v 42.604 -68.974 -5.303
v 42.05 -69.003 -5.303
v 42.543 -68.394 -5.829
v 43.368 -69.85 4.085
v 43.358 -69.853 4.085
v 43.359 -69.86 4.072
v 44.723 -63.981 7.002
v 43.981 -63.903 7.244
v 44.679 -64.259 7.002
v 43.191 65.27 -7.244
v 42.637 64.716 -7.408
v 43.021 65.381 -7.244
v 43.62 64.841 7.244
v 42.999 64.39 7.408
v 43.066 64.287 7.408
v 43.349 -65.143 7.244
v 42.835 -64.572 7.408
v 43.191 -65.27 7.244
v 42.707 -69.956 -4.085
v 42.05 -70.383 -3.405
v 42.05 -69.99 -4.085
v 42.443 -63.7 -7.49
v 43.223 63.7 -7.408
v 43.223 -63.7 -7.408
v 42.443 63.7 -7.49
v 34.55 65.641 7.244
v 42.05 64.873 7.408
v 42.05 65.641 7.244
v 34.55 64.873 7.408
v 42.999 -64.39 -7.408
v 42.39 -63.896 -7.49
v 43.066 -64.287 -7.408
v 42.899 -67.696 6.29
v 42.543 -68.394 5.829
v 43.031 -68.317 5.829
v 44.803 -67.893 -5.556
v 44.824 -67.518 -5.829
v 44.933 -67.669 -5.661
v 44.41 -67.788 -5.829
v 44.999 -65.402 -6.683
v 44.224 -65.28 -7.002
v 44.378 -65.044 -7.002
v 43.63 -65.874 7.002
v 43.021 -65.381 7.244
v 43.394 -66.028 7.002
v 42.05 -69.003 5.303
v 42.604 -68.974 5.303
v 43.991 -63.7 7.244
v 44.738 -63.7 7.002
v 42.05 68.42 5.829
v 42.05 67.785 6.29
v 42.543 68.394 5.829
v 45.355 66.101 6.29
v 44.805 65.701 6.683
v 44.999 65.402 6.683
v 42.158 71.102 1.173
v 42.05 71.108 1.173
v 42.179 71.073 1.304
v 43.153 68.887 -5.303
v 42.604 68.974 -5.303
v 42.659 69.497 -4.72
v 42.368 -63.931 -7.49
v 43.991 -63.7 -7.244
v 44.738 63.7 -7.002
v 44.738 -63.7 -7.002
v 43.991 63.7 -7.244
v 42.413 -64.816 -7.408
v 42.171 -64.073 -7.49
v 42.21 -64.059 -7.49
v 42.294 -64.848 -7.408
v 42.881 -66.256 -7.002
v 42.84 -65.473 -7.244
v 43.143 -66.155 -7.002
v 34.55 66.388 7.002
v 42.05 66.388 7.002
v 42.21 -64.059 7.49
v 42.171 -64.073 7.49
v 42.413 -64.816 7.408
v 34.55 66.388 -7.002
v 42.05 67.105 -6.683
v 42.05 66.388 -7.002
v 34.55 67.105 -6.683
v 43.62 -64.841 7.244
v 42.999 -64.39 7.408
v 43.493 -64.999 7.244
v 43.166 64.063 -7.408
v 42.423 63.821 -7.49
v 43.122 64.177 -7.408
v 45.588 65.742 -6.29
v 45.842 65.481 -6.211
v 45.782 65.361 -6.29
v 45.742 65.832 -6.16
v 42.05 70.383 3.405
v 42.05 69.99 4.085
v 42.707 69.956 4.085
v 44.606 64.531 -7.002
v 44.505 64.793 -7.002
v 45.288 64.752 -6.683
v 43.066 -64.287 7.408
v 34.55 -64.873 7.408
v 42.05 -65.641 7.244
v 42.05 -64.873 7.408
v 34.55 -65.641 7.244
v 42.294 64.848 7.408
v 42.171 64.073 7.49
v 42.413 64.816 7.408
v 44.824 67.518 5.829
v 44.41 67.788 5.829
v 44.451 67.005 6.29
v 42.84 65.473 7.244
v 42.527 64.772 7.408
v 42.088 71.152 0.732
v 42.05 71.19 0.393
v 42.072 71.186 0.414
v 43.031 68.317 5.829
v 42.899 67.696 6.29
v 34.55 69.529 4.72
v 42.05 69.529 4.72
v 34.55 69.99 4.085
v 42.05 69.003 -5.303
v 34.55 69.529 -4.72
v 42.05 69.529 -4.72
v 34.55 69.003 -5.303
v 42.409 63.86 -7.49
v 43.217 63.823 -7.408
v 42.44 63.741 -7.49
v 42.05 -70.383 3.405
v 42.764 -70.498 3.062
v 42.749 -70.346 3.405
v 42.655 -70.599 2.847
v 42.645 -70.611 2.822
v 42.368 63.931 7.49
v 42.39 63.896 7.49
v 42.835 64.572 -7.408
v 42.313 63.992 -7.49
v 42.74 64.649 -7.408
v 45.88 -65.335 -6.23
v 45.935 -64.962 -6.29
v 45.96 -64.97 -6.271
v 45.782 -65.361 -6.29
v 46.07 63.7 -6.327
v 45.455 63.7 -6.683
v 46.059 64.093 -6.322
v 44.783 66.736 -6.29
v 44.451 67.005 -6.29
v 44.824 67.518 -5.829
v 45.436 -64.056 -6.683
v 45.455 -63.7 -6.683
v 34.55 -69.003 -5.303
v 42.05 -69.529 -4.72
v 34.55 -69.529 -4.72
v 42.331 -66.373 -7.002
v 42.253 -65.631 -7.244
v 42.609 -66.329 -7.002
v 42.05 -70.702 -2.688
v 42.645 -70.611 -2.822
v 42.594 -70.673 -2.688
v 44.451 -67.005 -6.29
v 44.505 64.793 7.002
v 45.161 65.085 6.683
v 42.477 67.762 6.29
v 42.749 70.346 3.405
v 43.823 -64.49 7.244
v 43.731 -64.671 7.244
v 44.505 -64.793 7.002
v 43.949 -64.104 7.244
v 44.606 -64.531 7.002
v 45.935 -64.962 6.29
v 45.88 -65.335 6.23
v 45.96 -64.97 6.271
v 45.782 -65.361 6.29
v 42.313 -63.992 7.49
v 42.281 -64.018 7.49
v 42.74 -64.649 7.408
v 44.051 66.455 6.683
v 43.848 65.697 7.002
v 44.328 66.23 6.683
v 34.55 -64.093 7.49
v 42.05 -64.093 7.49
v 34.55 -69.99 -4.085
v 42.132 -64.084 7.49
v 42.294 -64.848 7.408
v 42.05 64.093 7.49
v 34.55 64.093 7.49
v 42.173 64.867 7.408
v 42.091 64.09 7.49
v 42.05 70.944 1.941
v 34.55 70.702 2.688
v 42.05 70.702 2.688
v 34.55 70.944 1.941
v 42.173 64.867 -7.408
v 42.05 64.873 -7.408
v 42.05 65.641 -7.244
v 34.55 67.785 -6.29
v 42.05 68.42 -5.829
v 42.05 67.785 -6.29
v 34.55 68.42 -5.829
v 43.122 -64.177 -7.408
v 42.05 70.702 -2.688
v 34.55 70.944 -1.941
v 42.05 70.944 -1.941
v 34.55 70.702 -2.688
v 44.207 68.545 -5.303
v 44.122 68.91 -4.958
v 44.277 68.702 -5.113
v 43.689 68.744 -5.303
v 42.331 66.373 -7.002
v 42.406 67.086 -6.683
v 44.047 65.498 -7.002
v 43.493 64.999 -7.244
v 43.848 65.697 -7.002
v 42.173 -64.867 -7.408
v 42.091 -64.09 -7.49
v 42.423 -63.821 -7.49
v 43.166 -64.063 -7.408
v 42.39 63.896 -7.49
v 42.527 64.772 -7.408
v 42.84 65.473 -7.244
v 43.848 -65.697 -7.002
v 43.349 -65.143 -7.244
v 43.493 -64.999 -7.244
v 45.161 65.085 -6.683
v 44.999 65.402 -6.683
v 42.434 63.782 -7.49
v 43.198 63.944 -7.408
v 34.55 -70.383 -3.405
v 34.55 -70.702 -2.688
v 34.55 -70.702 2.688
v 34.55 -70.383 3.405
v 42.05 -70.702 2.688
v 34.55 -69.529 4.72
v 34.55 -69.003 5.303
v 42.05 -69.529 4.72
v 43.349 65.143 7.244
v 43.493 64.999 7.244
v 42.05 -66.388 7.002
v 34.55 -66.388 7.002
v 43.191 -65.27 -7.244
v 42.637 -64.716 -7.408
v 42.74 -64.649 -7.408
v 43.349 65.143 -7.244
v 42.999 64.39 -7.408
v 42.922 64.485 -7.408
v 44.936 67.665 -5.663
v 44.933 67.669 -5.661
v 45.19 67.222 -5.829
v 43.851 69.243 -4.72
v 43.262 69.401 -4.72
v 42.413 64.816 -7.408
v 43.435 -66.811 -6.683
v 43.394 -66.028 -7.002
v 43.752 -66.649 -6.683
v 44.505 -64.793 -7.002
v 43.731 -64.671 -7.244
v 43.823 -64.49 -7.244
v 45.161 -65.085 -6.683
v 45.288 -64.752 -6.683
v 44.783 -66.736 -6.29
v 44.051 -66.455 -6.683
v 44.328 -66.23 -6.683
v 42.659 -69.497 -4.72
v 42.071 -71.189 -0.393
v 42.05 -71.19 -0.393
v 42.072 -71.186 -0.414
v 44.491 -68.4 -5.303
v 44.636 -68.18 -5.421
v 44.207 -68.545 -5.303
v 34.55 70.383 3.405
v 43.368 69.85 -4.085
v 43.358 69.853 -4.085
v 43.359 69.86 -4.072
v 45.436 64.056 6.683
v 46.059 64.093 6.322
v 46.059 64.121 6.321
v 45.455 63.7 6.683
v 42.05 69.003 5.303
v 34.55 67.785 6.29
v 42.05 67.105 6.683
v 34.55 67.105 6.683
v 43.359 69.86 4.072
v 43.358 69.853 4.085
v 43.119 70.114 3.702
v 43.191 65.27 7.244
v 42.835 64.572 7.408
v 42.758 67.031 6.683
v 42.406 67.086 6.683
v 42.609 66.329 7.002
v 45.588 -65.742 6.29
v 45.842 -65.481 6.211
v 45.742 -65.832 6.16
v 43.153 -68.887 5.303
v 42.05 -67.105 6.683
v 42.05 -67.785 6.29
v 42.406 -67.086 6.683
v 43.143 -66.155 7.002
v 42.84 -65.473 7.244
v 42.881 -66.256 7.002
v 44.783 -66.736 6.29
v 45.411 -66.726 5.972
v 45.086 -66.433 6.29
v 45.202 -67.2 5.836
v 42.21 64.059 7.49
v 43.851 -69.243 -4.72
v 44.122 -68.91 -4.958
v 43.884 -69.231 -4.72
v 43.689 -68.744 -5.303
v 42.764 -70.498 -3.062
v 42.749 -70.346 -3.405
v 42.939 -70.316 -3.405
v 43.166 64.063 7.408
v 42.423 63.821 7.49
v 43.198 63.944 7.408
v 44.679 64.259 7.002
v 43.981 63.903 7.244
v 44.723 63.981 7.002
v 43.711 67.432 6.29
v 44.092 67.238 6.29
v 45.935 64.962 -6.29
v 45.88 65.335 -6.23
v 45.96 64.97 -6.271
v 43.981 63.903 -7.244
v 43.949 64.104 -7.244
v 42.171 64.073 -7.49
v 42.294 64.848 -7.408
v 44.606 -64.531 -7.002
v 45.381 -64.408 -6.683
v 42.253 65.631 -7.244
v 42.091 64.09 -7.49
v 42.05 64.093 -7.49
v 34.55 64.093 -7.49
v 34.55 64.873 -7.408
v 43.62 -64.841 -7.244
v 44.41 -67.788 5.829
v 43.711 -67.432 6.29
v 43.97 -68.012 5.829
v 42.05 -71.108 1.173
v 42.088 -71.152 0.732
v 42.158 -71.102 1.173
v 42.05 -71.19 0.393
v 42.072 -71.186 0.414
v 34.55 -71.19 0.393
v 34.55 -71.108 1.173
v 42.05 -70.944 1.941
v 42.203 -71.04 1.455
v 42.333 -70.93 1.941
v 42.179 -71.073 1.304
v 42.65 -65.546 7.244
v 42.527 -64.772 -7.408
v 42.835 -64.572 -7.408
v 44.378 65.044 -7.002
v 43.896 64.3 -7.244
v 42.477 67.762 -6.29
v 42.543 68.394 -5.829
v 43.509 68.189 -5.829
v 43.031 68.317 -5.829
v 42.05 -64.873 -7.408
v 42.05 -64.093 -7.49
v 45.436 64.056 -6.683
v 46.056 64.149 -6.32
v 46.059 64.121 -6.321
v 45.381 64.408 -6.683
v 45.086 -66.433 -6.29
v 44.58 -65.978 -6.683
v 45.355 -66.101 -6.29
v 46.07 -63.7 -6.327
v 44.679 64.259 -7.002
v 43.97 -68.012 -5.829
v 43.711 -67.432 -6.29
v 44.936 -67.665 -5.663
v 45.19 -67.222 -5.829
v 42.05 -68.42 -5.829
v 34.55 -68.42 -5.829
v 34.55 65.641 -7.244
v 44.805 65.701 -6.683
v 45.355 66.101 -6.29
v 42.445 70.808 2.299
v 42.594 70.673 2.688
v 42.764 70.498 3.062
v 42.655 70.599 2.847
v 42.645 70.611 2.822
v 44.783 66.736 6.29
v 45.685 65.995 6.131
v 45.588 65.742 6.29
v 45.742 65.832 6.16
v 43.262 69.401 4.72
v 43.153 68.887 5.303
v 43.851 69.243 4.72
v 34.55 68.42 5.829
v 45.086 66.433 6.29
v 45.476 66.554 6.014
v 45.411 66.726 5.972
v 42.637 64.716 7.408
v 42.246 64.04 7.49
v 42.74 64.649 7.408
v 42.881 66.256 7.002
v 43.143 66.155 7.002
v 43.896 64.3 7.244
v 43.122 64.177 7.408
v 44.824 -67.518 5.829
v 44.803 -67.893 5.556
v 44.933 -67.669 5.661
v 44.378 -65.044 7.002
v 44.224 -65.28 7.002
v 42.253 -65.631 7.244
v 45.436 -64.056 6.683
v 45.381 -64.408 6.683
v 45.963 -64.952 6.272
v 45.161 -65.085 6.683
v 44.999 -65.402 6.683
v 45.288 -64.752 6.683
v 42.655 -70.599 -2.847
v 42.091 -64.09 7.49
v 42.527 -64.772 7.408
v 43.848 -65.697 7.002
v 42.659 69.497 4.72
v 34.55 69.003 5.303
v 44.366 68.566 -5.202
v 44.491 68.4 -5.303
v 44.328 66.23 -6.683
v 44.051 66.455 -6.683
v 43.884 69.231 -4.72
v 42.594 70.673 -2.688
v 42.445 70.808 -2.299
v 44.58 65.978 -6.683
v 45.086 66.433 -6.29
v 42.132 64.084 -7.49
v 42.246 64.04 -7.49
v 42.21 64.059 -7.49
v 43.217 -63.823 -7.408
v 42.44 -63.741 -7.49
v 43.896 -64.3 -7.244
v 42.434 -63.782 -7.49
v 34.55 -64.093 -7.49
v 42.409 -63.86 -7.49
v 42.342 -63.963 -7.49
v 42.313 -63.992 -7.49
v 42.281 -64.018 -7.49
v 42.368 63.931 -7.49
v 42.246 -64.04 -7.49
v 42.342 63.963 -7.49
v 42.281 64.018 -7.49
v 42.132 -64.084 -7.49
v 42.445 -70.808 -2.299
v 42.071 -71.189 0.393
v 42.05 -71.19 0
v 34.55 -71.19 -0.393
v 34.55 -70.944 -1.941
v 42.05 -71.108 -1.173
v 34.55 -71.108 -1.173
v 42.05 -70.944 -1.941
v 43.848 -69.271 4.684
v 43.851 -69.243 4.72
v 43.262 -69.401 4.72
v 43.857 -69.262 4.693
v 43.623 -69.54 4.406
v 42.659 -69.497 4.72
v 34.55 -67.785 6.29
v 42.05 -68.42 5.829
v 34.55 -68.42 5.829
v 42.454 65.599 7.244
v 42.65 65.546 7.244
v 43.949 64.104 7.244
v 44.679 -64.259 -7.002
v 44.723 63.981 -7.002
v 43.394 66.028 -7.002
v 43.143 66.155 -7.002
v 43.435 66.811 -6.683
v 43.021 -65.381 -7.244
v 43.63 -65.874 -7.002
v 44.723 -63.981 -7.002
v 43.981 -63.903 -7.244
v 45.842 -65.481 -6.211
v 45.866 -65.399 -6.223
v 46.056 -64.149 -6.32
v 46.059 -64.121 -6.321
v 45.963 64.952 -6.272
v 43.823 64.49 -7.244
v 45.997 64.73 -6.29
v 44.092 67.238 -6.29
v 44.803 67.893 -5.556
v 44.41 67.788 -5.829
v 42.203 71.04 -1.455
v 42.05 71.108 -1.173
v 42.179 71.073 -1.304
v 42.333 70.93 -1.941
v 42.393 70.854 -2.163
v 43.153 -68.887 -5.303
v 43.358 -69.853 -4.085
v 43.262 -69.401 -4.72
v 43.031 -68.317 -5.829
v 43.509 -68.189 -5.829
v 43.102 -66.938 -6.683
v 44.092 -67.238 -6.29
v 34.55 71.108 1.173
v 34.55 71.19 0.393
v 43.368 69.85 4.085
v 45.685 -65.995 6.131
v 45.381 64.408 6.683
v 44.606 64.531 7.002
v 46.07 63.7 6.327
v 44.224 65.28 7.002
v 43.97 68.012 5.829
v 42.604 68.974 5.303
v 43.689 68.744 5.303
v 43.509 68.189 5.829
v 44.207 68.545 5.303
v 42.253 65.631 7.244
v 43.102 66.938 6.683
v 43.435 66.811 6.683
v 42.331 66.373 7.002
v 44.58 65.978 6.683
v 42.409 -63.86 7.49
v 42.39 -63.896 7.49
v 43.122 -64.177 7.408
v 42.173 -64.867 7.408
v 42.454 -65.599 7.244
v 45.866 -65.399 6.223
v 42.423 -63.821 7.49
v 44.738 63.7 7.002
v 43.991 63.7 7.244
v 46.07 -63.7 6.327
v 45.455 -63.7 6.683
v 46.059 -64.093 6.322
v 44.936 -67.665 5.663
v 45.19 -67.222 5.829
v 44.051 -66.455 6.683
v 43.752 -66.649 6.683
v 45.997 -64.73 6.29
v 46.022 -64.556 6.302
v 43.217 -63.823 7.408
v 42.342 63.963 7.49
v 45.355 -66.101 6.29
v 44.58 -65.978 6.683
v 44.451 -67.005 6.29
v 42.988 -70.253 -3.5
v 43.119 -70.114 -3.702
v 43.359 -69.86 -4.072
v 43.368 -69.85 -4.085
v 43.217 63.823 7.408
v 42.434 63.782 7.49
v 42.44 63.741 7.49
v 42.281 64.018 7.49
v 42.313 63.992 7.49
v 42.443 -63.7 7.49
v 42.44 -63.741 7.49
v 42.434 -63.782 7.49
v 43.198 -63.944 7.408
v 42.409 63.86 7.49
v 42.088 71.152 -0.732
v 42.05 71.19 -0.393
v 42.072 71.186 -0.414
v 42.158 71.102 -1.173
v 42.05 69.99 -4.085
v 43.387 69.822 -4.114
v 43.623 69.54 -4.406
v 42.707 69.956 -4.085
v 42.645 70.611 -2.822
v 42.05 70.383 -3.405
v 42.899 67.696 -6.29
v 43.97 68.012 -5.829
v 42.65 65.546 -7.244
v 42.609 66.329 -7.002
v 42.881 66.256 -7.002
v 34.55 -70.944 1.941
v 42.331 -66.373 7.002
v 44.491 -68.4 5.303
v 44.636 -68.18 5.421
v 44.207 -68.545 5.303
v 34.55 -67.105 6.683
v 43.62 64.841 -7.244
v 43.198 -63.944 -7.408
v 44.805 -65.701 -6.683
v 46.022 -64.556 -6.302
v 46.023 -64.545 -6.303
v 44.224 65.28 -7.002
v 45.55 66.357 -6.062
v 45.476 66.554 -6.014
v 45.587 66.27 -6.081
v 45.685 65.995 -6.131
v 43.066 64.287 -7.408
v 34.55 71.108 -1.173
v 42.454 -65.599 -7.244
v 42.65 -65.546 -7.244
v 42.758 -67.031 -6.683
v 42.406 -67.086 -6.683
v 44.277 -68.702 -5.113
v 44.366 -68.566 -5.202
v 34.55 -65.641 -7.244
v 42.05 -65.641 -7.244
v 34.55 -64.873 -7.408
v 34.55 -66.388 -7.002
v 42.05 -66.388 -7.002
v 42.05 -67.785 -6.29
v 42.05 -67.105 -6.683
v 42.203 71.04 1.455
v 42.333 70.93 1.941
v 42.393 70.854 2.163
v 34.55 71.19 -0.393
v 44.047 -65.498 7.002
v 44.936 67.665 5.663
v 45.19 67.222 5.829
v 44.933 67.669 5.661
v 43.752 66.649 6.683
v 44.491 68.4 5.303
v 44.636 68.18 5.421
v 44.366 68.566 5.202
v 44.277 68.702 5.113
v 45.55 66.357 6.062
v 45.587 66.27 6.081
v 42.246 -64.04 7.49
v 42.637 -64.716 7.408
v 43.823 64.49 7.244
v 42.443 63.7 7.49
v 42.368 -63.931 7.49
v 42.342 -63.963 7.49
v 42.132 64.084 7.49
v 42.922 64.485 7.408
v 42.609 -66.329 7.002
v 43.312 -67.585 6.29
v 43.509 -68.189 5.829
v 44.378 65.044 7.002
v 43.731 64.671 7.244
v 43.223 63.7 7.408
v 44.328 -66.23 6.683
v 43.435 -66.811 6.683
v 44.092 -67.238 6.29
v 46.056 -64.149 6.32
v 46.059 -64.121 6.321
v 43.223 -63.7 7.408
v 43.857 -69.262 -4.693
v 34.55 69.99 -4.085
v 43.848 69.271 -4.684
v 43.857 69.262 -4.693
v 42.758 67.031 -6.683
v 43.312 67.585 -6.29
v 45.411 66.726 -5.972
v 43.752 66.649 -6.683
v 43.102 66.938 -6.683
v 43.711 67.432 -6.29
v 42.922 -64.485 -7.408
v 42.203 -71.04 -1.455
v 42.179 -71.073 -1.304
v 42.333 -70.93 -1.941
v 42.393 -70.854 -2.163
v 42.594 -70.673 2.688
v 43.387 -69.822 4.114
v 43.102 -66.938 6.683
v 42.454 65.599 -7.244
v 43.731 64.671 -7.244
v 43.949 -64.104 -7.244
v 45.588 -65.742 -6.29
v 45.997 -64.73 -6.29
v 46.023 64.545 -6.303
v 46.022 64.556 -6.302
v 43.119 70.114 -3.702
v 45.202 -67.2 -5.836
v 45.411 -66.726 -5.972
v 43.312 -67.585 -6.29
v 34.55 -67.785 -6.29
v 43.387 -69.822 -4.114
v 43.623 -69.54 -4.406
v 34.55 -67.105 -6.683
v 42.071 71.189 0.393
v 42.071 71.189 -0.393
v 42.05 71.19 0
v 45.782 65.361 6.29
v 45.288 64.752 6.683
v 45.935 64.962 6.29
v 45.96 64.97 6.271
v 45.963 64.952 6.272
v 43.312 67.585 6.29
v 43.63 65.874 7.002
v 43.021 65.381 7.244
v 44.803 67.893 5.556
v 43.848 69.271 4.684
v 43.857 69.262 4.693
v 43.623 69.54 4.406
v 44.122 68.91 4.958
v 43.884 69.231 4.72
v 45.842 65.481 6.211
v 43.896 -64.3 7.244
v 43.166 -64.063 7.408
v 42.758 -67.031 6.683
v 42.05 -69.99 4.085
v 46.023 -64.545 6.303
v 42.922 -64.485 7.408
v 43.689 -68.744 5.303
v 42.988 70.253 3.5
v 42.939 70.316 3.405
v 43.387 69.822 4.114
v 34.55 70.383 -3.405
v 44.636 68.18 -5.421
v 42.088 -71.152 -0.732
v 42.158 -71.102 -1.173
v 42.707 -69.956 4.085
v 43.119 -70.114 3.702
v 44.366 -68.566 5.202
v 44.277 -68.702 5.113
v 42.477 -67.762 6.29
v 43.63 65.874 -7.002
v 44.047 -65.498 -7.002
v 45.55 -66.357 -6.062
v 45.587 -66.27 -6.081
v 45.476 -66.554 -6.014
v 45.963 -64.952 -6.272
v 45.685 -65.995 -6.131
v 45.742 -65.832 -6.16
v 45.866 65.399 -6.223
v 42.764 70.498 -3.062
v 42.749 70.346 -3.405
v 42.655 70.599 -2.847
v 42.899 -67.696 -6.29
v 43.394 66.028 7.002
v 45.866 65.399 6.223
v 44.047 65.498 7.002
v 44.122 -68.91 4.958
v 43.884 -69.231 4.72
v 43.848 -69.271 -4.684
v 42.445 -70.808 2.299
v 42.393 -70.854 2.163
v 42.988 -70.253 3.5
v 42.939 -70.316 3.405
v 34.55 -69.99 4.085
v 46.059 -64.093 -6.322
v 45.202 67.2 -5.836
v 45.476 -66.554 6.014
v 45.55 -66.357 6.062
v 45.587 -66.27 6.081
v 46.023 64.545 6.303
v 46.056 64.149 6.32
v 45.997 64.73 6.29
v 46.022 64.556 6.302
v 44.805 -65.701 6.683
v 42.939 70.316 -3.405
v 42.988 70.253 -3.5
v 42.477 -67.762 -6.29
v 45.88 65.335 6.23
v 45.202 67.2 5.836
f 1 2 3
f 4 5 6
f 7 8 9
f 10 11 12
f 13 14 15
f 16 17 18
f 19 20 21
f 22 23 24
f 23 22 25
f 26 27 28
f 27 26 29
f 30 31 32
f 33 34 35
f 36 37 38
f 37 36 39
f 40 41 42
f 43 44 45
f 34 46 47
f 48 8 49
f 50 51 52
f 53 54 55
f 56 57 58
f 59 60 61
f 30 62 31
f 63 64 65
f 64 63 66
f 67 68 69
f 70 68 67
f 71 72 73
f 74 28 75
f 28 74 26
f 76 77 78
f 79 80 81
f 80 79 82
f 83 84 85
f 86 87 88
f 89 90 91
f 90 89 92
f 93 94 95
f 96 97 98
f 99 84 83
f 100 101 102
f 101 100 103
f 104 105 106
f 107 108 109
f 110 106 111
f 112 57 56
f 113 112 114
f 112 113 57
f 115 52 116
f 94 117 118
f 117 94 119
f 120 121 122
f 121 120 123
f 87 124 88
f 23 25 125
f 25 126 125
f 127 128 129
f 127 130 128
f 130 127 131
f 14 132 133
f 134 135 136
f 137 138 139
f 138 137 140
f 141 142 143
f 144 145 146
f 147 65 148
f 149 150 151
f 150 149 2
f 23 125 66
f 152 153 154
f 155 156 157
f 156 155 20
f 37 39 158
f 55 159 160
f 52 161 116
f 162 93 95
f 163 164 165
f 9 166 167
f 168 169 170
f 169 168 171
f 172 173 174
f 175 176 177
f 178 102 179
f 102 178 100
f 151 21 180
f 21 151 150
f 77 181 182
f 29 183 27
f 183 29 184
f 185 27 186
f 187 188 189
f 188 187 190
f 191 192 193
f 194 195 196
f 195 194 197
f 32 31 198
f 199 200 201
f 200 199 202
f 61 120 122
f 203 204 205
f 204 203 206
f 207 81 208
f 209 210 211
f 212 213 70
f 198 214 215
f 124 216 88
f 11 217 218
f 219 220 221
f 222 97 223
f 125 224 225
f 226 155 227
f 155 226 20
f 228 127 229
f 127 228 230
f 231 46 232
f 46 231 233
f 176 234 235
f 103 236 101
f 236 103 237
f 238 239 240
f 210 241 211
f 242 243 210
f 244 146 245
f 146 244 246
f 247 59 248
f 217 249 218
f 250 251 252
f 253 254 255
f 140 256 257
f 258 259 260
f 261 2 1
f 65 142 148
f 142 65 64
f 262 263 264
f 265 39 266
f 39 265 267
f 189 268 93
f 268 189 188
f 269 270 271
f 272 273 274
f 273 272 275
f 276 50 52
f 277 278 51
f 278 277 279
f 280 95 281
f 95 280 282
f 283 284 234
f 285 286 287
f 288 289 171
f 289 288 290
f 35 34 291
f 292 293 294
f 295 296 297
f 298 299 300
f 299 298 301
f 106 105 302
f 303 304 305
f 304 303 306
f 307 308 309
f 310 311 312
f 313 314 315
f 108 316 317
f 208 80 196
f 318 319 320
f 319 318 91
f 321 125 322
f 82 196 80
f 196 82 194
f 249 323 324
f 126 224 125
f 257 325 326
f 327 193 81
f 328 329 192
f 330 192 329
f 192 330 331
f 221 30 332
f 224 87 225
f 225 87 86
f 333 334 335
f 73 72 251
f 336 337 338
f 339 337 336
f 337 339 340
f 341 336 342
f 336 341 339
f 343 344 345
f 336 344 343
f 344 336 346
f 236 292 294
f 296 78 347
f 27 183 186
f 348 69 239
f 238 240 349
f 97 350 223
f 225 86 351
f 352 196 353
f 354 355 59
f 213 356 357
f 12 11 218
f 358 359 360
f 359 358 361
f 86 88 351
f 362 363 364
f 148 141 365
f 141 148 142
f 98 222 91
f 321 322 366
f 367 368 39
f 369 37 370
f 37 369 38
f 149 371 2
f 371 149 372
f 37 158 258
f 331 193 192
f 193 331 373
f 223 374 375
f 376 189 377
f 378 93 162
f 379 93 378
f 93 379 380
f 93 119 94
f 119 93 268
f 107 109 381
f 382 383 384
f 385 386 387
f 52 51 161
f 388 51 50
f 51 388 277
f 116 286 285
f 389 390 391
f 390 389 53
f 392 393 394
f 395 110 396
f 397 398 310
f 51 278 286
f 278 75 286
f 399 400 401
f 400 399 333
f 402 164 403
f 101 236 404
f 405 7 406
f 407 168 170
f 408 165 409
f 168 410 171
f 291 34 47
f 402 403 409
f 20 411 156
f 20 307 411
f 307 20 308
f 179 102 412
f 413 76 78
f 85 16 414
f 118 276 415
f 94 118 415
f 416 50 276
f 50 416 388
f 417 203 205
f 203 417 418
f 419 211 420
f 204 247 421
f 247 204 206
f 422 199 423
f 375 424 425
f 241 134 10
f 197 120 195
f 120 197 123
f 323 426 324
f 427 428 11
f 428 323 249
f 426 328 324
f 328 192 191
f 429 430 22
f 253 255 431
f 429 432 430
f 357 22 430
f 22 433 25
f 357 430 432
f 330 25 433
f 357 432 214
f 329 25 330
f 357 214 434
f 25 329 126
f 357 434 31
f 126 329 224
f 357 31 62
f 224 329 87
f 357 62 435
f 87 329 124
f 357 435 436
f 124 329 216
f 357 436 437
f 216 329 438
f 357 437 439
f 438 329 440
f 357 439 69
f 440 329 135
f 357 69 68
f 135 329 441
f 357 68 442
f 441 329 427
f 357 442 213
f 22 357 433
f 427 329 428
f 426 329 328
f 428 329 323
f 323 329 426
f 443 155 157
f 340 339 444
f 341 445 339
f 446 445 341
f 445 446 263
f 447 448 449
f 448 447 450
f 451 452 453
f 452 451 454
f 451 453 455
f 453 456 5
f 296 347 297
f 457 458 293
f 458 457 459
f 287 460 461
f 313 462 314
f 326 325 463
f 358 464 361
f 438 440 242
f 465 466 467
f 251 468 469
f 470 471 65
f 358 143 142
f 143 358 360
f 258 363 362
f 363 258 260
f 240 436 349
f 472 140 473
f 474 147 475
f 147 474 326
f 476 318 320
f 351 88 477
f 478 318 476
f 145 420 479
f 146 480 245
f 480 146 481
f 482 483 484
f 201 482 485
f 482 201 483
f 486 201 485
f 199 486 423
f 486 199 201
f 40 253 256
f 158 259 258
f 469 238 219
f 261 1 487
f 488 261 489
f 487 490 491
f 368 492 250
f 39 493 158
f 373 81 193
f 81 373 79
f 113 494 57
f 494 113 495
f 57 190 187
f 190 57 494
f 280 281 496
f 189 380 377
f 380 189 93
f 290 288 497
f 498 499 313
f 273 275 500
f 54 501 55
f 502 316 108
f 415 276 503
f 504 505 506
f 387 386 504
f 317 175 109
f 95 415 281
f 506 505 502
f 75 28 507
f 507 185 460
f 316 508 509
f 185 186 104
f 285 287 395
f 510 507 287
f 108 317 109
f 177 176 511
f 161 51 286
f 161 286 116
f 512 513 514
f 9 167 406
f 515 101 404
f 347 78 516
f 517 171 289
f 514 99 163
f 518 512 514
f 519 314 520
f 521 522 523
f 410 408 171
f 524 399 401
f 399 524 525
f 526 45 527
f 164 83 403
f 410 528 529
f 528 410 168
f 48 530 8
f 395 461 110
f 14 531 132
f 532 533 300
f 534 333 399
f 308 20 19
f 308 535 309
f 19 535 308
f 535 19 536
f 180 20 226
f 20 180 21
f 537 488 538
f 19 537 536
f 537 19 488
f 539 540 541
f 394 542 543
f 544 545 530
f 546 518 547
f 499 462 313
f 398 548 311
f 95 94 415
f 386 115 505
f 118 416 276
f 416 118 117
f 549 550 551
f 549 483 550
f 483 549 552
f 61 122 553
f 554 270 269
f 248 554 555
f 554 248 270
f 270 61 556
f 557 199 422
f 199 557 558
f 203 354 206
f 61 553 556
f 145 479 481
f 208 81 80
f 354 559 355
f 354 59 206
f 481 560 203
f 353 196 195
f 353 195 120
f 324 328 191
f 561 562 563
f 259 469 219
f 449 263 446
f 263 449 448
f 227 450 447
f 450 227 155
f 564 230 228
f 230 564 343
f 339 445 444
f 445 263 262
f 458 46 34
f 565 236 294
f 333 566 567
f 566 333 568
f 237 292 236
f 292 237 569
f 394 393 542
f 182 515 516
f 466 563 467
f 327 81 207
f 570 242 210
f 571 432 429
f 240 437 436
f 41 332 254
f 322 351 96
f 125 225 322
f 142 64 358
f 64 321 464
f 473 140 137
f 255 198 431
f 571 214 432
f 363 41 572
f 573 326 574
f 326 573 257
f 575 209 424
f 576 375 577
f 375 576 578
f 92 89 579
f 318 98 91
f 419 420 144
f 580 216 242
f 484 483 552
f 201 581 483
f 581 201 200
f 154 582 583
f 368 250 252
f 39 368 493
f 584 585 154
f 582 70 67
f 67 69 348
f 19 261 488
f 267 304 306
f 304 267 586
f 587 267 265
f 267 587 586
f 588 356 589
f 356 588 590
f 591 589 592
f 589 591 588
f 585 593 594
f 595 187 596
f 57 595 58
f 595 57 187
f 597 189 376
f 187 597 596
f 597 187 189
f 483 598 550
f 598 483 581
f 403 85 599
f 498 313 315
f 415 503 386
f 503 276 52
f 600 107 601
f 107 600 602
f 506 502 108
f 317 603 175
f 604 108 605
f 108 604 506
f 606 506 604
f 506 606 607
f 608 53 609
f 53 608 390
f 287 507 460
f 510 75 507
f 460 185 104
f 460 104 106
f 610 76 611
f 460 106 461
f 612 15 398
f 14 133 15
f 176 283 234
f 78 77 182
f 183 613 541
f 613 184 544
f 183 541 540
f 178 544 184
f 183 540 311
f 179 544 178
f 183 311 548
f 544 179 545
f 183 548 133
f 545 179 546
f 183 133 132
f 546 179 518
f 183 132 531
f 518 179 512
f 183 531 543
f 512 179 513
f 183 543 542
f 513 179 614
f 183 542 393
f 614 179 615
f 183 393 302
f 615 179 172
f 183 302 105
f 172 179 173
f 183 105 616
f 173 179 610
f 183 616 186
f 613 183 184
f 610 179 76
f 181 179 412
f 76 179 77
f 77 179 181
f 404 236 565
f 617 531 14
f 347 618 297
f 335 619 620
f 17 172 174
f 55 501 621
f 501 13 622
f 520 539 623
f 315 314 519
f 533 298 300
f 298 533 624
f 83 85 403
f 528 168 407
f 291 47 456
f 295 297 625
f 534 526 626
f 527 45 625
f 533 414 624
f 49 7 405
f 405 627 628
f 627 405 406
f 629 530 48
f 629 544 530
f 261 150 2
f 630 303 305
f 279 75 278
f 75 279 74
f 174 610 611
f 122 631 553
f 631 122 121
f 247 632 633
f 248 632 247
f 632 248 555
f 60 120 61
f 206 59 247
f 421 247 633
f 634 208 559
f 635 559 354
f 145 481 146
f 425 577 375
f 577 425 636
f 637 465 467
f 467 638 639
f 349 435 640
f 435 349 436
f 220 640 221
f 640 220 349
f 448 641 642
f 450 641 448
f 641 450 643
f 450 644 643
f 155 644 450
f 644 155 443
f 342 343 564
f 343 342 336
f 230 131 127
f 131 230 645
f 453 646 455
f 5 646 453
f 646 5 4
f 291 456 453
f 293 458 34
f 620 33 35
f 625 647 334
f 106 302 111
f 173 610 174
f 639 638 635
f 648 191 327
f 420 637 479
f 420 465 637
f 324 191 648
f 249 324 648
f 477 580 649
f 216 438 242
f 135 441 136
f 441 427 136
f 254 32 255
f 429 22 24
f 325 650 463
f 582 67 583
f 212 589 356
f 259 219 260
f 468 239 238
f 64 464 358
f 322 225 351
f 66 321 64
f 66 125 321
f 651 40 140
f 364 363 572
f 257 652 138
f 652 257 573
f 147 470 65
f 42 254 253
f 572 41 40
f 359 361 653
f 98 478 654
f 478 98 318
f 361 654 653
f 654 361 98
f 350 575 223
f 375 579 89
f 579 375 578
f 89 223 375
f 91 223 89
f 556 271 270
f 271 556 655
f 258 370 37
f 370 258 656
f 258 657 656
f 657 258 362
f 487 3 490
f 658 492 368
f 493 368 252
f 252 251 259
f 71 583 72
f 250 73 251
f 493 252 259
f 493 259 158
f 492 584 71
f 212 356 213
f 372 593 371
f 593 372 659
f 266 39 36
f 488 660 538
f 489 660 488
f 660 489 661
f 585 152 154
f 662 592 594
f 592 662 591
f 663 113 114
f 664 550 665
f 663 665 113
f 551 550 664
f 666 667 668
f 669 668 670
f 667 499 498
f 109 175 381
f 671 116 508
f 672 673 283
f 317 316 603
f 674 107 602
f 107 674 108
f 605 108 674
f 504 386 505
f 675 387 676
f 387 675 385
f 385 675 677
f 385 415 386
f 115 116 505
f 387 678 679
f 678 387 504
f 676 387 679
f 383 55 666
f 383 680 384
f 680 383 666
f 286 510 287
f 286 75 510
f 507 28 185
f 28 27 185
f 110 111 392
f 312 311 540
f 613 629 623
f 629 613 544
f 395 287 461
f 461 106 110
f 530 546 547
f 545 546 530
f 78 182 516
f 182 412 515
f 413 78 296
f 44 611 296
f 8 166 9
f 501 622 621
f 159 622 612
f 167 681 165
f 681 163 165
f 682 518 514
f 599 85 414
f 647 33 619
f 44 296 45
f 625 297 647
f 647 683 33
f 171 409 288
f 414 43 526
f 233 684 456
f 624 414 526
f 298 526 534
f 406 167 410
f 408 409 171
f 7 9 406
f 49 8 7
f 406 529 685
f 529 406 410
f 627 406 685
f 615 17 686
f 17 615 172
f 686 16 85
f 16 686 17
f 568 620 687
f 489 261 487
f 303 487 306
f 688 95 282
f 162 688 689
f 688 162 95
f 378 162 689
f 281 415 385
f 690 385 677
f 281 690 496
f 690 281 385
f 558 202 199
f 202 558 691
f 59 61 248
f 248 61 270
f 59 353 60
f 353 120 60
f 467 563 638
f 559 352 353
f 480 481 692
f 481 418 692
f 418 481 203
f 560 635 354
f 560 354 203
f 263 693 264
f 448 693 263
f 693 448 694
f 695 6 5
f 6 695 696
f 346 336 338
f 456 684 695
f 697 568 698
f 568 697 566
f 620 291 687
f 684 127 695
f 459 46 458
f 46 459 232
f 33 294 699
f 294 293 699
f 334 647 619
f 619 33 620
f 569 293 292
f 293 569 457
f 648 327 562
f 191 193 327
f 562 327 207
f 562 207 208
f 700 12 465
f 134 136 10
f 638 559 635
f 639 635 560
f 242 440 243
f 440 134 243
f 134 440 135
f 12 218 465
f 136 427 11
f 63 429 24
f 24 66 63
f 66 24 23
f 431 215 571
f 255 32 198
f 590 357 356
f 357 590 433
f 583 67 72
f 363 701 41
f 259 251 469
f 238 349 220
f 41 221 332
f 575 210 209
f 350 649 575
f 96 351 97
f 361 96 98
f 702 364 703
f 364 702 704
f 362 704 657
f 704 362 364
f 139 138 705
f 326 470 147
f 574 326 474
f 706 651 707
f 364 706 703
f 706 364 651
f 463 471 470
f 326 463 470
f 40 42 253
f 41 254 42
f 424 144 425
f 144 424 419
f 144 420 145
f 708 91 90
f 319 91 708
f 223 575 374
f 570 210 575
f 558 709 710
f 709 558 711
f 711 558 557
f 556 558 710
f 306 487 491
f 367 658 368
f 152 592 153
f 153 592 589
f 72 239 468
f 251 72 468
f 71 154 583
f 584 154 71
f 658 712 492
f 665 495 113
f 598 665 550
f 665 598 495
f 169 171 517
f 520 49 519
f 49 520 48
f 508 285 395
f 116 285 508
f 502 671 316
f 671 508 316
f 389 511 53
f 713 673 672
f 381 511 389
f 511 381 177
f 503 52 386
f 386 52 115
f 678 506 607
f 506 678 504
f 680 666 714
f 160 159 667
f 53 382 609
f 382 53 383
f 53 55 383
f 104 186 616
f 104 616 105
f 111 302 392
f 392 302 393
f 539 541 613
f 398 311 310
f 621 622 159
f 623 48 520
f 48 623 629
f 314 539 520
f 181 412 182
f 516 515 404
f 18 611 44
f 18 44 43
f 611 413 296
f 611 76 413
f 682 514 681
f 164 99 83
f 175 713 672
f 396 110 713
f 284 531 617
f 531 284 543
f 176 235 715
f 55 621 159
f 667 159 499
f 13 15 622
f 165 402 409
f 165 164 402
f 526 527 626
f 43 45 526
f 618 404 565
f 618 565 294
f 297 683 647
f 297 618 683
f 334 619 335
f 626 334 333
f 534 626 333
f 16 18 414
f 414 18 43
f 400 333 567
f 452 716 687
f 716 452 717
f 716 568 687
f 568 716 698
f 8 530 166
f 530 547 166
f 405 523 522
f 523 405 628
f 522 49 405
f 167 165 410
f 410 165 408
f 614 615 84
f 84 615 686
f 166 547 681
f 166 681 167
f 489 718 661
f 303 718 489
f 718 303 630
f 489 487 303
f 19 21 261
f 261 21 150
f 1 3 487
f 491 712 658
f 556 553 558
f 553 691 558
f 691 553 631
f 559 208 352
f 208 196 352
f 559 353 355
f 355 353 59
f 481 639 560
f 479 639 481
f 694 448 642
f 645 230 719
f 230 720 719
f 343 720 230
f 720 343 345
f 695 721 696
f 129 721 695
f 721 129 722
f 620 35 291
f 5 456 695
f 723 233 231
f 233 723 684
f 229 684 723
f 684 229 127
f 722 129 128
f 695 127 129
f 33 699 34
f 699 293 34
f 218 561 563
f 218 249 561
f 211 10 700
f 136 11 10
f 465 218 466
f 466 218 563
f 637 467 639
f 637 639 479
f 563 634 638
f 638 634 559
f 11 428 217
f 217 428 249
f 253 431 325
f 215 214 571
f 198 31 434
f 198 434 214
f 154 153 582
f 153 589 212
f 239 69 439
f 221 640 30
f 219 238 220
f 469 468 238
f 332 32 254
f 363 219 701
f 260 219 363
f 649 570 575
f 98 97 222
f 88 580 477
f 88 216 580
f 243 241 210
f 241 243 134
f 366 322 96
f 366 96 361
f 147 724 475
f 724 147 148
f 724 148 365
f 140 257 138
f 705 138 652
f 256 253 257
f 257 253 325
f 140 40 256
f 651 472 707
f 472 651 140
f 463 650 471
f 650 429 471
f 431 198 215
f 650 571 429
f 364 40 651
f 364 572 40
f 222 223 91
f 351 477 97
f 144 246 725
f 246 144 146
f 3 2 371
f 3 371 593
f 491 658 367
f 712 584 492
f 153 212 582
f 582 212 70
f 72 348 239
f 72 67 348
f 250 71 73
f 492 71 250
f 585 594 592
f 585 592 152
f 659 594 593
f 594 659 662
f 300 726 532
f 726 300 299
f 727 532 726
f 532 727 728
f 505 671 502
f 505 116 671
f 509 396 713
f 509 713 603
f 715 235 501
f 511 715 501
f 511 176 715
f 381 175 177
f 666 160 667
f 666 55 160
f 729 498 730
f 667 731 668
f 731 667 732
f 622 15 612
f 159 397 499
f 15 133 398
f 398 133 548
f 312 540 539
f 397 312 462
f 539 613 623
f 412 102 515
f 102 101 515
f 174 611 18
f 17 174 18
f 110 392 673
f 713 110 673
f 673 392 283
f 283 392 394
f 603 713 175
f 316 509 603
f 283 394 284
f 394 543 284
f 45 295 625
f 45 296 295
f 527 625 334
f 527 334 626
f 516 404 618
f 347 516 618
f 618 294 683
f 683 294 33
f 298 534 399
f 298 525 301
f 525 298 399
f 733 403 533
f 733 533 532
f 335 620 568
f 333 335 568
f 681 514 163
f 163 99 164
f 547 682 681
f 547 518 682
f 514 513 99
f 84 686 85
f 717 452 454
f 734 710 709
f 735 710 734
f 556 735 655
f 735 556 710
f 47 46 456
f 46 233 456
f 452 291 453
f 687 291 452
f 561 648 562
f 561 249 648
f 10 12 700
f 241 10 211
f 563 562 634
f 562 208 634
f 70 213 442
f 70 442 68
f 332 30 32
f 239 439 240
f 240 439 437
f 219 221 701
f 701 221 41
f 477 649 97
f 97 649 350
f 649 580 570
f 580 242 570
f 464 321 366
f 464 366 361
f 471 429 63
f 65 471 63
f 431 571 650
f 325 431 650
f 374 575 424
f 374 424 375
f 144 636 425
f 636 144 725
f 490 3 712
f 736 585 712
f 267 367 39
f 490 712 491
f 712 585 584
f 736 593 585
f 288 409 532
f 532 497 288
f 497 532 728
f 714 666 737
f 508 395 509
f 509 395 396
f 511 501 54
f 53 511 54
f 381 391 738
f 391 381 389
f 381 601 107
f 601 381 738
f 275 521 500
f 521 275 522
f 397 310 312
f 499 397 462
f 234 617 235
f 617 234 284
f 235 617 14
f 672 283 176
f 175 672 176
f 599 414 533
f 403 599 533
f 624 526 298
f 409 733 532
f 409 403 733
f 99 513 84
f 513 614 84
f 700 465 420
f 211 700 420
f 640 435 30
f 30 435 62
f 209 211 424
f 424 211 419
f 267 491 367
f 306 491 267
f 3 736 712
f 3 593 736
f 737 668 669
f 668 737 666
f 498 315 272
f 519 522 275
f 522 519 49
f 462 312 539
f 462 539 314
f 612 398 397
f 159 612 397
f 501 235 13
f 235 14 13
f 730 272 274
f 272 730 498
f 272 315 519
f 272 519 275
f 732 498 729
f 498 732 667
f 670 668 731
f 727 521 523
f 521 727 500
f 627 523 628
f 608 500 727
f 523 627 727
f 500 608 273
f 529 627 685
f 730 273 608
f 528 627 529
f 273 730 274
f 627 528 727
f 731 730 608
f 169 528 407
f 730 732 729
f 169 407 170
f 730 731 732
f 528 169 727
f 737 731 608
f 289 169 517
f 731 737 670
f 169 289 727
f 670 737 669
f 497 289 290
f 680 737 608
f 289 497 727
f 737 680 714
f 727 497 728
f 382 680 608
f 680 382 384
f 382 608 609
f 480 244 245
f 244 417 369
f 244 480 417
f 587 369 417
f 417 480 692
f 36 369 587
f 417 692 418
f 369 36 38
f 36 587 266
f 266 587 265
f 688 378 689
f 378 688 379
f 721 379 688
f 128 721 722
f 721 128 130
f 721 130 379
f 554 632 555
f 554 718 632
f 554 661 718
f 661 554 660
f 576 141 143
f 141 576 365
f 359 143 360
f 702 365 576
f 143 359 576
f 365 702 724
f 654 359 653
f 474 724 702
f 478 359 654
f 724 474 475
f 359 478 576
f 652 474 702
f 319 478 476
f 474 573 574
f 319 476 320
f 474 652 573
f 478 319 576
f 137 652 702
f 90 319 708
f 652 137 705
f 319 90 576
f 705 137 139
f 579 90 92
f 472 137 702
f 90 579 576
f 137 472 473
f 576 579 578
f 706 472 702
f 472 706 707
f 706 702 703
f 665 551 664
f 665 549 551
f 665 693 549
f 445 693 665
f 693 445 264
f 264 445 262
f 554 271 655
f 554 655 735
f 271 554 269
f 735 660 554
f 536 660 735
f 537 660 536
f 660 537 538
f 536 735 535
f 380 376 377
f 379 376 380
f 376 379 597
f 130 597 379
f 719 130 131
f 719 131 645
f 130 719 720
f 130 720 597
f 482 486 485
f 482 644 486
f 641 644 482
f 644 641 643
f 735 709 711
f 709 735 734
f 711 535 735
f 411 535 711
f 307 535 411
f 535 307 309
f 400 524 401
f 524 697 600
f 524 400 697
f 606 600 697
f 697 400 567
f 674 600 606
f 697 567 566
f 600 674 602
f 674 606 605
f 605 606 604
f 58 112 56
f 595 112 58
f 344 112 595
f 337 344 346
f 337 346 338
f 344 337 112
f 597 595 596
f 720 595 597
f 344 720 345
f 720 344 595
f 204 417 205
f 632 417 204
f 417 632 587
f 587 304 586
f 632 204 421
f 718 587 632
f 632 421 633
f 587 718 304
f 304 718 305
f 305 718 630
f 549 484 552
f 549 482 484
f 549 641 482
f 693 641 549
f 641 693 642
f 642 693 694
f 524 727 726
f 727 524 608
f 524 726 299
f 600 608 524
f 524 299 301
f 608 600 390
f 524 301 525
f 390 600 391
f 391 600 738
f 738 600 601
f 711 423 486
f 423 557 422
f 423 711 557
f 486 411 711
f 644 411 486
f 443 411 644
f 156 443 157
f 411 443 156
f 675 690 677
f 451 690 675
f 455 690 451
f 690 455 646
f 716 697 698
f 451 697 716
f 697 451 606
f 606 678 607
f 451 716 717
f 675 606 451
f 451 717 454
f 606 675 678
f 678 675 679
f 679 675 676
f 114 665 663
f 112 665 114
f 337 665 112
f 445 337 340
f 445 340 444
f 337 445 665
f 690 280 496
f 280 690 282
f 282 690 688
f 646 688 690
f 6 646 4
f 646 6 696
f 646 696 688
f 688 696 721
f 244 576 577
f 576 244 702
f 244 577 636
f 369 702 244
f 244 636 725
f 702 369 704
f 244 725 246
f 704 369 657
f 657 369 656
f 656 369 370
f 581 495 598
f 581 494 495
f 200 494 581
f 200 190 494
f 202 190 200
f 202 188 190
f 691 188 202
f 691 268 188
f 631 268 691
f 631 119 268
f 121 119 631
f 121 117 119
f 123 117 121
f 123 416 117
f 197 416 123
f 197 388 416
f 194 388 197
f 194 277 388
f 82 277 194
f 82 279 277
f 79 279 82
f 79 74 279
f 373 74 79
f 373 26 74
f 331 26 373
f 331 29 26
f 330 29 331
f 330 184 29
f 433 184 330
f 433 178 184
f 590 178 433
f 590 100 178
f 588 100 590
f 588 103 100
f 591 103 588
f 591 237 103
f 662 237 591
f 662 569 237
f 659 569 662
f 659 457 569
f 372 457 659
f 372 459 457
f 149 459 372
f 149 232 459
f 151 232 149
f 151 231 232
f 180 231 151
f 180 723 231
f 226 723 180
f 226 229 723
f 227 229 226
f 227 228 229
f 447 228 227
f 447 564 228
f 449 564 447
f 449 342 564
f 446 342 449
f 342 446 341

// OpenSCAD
// file: threebyfive.scad
//
// src/threebyfive.scad

// unit is mm

o2 = 0.2;
o4 = 0.4;

inch = 25.4;

card_length = 5 * inch;
card_width = 3 * inch;

cyld = 14;
height = 15;

cl = card_length + o4;
cw = card_width + height / 2 + o4;

$fn = 60;


module outer_box() {

  difference() {

    hull() {

      translate([ -cw / 2,   cl / 2, 0 ]) sphere(d=height);
      translate([  cw / 2,   cl / 2, 0 ]) sphere(d=height);
      translate([ -cw / 2, - cl / 2, 0 ]) sphere(d=height);
      translate([  cw / 2, - cl / 2, 0 ]) sphere(d=height);
    }

    translate([ cw / 2 + cyld / 2, 0,  ]) rotate([ 90, 0, 0 ])
      cylinder(d=cyld, h=cl * 1.4, center=true);
  }
}
// main file
//
// src/east.scad

include <threebyfive.scad>;


difference() {

  outer_box();

  translate([ cw * 0.5 - height / 2 - 100, -cl, -height ])
    cube([ 100, cl * 2, height * 2 ]);

  //translate([ cw * 0.5 - height / 2, -cl, -height ])
  //  cube([ 50, cl * 2, height * 2 ]);
}
